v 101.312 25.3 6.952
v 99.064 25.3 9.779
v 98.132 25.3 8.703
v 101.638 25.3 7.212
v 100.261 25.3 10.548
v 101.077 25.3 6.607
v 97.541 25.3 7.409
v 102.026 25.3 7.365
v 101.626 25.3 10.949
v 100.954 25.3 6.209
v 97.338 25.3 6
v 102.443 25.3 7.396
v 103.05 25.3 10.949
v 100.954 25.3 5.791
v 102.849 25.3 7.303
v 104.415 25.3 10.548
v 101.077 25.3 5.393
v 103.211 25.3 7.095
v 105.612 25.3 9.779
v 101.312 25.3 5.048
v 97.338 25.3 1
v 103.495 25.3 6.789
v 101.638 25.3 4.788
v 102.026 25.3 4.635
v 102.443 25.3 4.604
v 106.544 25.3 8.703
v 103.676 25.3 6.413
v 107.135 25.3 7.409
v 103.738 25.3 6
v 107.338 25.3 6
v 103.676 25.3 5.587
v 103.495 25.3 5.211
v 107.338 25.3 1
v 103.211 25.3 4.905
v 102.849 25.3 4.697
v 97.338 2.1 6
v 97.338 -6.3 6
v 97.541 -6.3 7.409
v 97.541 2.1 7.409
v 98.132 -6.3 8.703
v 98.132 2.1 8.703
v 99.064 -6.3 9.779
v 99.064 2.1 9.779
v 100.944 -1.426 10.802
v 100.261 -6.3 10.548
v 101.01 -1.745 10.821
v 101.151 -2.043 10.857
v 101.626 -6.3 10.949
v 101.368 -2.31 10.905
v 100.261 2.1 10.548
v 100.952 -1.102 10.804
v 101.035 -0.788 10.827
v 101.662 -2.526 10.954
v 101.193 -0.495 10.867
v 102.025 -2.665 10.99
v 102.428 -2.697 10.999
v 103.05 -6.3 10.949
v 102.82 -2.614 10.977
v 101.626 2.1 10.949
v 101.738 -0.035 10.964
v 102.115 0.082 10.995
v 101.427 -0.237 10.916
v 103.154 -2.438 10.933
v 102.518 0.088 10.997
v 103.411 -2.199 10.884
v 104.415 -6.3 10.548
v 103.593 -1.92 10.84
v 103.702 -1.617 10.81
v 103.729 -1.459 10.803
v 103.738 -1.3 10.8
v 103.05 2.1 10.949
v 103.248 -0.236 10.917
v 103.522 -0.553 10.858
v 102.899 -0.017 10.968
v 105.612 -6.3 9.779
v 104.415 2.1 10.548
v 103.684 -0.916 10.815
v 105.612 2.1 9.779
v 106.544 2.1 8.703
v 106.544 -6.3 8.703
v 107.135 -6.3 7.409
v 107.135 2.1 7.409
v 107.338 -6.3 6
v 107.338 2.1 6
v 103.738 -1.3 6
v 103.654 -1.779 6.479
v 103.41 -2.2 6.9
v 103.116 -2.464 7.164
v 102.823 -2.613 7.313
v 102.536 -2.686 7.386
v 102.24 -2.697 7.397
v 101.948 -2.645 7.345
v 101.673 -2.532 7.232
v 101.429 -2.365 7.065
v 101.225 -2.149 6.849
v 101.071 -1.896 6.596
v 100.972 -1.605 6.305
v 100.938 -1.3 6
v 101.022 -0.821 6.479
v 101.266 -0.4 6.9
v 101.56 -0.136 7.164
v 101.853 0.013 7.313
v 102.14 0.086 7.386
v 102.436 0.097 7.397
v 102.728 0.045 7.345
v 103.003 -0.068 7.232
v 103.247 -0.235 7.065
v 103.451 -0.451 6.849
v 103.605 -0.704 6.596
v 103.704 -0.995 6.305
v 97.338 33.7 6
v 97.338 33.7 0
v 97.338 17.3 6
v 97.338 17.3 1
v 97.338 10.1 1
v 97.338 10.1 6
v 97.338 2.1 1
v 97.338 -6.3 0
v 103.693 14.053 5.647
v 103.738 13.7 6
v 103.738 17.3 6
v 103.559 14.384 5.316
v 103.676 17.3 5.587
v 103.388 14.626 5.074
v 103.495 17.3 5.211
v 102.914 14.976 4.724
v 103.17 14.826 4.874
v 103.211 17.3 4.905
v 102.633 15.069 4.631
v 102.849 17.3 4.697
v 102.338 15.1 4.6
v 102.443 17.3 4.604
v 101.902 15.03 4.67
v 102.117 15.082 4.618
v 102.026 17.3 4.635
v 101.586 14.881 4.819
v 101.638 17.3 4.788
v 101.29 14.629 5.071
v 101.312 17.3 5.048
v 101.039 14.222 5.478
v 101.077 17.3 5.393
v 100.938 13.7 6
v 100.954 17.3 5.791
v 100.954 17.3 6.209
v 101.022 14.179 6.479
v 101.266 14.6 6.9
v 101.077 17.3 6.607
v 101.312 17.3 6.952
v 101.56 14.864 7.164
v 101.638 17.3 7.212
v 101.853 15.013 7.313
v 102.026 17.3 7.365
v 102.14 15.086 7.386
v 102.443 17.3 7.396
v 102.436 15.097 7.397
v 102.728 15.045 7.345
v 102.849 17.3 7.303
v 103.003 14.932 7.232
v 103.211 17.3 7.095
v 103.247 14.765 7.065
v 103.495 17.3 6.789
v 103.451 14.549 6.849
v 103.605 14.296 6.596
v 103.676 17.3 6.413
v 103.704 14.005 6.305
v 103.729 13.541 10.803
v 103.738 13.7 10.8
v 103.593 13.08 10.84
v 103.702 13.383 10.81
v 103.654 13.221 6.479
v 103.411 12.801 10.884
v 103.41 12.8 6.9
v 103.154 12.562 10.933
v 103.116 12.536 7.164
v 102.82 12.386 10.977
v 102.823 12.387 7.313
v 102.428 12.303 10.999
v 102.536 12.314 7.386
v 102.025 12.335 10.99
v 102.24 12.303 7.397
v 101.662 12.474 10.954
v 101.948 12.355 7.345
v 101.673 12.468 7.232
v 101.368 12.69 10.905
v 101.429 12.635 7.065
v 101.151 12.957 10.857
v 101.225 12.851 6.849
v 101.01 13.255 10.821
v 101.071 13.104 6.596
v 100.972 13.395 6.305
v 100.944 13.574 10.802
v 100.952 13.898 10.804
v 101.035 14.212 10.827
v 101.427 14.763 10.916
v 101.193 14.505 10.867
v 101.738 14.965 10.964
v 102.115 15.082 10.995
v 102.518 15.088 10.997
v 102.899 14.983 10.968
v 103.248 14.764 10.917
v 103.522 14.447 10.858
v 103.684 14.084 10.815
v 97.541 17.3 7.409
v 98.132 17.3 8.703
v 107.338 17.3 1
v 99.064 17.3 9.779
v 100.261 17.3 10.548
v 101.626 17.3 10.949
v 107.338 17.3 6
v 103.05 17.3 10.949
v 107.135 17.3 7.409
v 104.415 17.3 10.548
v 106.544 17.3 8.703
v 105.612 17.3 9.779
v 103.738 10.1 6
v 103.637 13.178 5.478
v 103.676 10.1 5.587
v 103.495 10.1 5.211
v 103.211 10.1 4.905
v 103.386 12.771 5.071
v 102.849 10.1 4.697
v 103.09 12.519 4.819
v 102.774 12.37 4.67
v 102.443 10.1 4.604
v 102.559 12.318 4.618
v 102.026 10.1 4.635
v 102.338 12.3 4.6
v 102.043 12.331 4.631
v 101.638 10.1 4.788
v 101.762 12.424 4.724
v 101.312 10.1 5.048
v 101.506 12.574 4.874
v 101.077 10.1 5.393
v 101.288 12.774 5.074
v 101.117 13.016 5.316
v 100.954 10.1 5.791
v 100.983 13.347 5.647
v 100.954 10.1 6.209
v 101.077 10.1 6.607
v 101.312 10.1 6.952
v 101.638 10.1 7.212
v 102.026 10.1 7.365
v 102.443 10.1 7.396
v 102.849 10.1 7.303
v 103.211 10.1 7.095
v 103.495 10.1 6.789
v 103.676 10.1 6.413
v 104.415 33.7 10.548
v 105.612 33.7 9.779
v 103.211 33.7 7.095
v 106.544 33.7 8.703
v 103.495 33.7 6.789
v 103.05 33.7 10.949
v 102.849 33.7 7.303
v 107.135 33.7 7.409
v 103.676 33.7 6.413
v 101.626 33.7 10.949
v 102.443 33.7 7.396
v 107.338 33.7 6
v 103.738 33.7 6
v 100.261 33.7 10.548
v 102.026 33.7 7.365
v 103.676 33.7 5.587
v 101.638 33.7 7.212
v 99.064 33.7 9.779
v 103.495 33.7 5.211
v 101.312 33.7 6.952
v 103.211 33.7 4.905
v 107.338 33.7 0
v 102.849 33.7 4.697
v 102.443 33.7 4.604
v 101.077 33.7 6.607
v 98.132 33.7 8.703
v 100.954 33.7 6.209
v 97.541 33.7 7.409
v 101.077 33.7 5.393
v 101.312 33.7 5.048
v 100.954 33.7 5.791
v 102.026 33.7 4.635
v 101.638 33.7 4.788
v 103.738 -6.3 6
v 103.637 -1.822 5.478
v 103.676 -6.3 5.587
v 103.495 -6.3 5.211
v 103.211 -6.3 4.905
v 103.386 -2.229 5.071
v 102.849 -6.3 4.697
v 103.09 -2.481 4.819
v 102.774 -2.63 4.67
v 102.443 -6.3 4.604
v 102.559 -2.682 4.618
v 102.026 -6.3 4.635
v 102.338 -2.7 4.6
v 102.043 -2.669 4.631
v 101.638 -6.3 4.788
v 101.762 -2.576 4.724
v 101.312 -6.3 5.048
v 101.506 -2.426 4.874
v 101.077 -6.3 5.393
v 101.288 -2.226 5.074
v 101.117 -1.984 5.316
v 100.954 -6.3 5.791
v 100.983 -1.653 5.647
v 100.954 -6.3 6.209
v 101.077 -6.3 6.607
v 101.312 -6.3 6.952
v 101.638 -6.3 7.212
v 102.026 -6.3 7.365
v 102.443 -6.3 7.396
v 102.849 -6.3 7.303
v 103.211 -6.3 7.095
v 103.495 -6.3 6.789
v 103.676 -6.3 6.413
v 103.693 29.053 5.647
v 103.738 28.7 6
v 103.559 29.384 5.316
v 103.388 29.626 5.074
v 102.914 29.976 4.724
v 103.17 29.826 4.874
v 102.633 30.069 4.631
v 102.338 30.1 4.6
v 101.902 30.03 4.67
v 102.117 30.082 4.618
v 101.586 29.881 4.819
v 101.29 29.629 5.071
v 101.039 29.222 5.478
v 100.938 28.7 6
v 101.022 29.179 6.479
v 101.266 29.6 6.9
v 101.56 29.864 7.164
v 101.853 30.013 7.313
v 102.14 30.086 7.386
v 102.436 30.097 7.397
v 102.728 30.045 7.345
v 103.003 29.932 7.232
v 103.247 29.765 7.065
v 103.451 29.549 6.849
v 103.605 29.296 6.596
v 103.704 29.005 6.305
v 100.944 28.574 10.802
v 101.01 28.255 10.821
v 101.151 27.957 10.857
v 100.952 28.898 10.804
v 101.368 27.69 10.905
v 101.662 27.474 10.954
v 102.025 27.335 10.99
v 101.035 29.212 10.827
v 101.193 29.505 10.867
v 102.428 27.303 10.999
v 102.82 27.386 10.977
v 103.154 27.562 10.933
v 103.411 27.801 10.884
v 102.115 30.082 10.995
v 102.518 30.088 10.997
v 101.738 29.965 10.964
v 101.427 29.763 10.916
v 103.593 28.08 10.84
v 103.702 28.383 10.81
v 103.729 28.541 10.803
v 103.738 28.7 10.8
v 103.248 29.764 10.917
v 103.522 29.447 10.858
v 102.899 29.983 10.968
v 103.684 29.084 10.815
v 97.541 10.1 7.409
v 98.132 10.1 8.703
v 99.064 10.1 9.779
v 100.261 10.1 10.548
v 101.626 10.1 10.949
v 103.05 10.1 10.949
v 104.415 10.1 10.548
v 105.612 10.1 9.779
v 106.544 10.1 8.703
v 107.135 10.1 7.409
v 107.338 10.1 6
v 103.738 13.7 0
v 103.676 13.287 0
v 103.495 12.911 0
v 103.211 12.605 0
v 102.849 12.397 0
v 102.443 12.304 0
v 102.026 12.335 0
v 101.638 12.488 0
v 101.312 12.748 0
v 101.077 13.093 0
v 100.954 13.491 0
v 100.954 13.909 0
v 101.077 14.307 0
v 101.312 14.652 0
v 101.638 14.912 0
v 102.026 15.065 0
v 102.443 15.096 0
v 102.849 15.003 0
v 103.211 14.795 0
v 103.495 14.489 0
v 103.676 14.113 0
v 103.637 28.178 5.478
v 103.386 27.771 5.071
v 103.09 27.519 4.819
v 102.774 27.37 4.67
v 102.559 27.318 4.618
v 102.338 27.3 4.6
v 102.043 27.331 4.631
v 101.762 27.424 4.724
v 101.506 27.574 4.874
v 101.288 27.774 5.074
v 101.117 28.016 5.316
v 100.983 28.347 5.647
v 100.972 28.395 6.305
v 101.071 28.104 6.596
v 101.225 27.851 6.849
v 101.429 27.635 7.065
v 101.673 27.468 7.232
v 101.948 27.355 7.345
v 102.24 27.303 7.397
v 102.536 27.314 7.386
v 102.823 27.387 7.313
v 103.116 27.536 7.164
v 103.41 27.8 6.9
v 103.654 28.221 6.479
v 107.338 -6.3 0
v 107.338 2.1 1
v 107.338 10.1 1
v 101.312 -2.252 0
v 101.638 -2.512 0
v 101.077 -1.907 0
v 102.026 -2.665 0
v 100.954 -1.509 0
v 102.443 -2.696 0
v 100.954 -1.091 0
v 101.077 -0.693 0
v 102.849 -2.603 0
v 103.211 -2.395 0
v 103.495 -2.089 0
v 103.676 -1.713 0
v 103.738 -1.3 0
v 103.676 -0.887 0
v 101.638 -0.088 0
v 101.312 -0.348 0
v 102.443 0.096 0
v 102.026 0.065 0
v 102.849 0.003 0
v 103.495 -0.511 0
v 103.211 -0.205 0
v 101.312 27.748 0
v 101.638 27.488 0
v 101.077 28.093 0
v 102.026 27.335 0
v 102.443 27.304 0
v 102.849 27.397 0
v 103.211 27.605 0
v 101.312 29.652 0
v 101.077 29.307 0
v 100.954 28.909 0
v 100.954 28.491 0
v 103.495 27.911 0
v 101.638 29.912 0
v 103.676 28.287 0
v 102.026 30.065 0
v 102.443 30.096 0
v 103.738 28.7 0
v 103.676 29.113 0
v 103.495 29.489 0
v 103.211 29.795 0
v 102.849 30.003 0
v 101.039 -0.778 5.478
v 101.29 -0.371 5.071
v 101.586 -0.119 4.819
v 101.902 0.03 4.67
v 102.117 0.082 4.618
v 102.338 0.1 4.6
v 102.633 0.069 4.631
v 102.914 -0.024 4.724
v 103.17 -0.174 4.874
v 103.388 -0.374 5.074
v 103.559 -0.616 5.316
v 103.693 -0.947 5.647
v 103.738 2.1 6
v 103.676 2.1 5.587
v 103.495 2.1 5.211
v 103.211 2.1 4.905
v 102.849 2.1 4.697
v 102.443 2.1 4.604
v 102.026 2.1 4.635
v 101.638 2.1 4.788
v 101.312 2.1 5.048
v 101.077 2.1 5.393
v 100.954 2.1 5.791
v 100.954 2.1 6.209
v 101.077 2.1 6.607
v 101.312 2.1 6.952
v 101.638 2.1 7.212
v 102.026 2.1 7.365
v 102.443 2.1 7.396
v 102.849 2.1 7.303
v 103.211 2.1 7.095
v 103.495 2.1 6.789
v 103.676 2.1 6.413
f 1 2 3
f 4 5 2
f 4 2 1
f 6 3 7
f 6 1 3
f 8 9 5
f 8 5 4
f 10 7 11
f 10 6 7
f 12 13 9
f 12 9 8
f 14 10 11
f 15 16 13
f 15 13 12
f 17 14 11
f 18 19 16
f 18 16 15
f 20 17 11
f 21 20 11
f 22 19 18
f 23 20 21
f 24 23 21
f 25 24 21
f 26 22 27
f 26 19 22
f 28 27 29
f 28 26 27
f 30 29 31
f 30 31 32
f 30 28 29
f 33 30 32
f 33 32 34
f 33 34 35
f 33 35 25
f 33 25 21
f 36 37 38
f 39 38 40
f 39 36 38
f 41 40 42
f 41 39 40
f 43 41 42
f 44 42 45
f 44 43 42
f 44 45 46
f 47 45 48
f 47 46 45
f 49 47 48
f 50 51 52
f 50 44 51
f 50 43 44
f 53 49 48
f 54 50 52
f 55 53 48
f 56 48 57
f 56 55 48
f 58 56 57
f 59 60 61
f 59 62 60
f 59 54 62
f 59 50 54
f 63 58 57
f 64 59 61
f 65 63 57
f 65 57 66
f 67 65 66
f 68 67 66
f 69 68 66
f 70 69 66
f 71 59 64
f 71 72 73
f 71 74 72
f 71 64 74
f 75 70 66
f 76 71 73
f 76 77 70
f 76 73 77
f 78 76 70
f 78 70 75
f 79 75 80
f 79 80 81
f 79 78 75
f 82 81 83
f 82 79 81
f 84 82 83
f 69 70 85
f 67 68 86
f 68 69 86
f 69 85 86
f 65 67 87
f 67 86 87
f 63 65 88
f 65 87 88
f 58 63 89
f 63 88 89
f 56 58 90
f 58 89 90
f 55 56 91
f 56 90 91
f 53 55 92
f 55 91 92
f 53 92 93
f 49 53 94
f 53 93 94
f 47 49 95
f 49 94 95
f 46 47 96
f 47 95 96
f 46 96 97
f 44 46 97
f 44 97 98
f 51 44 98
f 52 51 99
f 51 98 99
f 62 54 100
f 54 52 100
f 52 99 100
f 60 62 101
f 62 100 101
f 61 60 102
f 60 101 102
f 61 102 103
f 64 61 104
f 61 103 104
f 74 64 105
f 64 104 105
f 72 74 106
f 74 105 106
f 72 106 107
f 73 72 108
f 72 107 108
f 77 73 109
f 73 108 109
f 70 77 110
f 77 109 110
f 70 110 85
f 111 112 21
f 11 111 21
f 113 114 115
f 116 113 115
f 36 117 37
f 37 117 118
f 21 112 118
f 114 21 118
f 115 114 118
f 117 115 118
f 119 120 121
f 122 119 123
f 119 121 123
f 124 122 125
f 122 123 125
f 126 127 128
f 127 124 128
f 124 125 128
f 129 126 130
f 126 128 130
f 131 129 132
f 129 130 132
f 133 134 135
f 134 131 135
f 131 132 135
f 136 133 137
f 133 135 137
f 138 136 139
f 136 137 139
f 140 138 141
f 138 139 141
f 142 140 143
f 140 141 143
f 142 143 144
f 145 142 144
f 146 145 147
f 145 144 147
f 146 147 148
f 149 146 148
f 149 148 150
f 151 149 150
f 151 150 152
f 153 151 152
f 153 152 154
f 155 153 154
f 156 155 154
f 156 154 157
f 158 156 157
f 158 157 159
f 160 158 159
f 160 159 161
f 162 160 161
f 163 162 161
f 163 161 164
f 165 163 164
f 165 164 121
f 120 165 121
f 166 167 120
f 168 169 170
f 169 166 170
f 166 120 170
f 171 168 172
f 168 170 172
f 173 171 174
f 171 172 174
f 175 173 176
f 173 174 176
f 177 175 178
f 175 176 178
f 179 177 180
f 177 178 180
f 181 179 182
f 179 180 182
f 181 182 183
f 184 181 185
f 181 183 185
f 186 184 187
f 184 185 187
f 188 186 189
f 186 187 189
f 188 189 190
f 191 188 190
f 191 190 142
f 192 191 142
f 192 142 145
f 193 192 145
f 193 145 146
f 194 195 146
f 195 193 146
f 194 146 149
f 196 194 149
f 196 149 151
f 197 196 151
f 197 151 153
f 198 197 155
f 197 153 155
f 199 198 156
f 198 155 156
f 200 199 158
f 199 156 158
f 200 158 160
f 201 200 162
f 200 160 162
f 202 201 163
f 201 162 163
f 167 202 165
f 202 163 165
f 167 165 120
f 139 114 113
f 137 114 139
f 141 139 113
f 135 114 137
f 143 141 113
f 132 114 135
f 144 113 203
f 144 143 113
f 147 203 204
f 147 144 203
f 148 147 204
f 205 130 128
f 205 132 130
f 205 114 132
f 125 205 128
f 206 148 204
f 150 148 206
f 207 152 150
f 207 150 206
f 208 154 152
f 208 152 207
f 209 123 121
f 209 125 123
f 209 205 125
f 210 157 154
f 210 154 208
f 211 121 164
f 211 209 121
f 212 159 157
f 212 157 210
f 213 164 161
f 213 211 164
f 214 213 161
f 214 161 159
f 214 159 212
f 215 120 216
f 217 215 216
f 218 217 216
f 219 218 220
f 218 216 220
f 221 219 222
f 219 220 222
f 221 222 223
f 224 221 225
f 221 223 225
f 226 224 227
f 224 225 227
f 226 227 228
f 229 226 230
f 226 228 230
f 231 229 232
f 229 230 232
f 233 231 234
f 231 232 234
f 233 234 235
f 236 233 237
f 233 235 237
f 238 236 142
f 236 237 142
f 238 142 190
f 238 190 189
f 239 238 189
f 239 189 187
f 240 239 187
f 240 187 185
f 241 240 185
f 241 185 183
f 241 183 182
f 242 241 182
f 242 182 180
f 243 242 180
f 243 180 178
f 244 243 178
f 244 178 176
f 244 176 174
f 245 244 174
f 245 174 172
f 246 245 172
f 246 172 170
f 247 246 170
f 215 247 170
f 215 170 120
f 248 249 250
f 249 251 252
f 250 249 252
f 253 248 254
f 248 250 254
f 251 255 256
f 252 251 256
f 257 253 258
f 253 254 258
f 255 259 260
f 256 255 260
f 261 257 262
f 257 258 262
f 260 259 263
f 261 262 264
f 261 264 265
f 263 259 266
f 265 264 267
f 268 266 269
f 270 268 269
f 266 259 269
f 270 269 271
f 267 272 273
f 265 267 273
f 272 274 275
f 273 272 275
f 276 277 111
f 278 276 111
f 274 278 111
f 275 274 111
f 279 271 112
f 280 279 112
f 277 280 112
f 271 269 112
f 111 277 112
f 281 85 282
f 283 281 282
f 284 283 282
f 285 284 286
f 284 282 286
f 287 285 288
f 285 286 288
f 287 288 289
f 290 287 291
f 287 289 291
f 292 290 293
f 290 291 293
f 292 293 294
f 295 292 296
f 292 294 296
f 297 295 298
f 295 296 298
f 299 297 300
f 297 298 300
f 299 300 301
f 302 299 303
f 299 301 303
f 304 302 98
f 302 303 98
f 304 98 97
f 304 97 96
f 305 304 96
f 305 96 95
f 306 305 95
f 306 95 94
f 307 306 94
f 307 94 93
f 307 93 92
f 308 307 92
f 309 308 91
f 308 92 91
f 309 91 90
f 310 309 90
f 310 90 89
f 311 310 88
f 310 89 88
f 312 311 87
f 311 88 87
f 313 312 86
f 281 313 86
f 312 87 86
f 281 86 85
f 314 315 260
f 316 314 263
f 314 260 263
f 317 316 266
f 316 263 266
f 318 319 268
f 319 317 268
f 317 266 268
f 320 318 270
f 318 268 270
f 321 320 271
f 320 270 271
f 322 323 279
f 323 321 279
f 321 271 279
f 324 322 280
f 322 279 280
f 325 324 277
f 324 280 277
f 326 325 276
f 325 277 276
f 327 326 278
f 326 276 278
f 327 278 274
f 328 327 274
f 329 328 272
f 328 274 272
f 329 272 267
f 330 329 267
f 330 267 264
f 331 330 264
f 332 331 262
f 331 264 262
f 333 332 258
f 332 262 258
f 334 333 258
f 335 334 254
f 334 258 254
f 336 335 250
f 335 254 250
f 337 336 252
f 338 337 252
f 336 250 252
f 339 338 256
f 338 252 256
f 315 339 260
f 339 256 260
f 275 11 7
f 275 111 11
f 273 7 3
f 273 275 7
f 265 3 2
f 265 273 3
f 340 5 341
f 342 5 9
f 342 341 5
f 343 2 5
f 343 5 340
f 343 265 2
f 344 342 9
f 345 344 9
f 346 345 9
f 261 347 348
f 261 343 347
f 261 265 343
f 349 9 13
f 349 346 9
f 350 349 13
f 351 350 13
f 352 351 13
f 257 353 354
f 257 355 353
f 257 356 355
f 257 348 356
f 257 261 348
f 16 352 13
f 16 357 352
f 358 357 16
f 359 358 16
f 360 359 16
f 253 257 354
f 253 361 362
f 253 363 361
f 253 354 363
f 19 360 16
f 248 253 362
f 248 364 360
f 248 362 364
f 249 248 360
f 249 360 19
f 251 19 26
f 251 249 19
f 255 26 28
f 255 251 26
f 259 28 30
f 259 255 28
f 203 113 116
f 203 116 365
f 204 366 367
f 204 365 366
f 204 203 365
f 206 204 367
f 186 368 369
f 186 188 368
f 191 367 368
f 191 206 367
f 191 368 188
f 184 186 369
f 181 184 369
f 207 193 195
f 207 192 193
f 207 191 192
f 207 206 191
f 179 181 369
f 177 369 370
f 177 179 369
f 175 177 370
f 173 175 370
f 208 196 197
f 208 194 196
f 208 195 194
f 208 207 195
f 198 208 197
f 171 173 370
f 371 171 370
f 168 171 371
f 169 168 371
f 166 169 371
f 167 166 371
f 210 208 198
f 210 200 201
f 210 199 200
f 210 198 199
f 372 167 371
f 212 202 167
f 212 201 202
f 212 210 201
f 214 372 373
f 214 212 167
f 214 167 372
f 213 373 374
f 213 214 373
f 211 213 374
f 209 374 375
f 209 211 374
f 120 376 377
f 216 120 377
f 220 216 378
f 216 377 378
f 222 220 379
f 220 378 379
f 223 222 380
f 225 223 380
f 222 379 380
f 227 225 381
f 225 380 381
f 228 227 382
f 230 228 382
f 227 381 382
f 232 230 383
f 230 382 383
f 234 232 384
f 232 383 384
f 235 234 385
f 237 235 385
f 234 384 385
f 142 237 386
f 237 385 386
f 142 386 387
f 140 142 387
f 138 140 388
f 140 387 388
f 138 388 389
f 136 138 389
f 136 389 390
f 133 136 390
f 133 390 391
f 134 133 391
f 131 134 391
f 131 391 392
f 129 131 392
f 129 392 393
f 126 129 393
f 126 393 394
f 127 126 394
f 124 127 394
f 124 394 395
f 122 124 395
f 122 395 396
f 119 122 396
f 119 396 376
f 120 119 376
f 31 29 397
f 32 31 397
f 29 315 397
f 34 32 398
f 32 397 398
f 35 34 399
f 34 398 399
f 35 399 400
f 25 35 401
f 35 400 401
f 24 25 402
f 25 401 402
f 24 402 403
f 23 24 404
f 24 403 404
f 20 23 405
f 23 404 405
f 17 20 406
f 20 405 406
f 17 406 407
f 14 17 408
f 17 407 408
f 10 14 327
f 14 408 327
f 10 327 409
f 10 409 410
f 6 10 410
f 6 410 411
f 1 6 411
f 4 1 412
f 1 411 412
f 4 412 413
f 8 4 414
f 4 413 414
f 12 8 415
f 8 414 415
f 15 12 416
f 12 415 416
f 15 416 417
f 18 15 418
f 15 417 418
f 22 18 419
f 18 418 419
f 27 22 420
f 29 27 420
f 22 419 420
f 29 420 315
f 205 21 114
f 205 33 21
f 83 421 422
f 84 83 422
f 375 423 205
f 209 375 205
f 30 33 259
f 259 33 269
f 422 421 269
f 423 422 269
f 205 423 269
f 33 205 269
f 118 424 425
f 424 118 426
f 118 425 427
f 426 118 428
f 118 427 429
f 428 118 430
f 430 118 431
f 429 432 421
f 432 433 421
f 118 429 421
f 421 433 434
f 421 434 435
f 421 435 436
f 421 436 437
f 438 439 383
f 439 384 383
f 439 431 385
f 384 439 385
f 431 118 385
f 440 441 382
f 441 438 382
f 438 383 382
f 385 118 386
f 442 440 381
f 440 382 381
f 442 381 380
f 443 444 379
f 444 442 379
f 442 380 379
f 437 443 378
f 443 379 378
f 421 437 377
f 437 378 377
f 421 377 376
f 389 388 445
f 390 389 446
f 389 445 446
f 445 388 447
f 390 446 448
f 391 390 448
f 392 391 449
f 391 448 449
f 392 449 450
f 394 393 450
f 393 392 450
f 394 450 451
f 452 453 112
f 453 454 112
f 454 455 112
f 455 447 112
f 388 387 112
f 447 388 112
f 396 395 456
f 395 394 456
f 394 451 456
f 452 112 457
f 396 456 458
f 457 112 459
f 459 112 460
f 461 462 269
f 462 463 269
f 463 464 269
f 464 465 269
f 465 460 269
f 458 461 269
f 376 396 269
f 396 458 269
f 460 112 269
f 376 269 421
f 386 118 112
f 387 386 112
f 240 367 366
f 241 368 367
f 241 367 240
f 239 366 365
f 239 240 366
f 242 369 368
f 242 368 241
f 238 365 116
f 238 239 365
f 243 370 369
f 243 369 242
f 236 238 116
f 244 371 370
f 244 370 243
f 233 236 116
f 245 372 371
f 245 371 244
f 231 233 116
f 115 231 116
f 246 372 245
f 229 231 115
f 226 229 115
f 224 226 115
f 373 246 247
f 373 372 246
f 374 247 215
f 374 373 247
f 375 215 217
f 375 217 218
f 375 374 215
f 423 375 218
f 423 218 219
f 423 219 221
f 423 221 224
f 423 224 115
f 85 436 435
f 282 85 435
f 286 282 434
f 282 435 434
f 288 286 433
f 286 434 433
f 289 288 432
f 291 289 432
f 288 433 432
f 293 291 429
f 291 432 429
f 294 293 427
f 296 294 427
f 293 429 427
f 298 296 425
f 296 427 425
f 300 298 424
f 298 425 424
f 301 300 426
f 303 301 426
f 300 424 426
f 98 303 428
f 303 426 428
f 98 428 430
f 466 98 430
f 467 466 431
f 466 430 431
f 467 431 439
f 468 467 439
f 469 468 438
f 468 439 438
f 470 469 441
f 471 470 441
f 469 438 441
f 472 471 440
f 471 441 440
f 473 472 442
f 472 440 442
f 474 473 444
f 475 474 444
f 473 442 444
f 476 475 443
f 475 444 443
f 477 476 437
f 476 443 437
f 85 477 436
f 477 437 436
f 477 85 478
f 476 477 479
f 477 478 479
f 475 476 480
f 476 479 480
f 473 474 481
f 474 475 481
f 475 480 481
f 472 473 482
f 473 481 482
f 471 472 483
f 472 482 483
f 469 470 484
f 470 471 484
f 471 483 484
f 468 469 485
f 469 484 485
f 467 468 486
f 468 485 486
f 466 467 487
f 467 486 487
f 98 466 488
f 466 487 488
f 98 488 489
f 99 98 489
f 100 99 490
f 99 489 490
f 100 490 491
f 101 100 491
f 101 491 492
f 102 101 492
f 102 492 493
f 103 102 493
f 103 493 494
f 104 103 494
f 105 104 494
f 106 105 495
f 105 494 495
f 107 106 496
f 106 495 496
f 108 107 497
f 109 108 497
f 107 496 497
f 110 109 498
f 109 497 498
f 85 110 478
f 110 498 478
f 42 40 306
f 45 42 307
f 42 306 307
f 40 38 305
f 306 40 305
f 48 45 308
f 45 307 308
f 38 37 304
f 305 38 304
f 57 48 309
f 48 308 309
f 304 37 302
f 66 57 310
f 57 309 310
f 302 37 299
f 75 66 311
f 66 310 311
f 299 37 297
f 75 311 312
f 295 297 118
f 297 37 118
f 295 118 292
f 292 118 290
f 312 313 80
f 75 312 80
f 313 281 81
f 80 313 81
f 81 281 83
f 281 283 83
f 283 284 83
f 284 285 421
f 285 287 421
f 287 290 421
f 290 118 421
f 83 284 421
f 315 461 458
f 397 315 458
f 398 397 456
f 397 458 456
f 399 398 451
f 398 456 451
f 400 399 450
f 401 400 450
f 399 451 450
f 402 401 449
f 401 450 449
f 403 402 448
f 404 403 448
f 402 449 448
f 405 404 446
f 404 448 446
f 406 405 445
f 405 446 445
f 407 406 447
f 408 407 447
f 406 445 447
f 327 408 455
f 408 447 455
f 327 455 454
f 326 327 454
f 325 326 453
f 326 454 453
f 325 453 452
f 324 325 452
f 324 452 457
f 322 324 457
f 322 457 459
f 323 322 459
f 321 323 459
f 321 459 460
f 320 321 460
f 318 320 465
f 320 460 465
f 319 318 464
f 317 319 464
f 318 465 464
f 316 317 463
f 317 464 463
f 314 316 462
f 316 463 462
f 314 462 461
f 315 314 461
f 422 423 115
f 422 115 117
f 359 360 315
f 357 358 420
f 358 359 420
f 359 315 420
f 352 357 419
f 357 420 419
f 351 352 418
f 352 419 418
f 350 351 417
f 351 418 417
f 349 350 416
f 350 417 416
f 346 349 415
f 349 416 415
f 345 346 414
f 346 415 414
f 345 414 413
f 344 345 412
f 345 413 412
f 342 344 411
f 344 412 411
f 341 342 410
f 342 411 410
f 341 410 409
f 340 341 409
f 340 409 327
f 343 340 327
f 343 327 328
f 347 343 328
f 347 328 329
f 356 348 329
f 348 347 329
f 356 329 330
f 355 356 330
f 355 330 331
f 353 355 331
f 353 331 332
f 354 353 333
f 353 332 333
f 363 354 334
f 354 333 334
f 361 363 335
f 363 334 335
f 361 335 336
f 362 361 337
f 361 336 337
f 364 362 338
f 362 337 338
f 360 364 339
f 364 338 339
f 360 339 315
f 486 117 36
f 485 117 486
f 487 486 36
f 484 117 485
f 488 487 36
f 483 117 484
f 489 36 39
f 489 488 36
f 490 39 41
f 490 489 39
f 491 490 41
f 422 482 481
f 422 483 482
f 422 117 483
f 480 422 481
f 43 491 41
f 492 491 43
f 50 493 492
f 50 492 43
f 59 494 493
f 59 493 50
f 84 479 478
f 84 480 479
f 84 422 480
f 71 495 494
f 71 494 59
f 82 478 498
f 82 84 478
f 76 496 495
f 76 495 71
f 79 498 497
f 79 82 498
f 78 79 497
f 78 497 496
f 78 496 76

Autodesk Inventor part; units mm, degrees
ref_plane "YZ Plane" through (0, 0, 0) normal (1, 0, 0) x (0, 1, 0)
ref_plane "XZ Plane" through (0, 0, 0) normal (0, 1, 0) x (-1, 0, 0)
ref_plane "XY Plane" through (0, 0, 0) normal (0, 0, 1) x (1, 0, 0)
ref_plane "Arbeitsebene1" through (0, 0, 0) normal (0, 0, 1) x (1, 0, 0)
sketch "Skizze1" plane through (0, 0, 0) normal (0, 0, 1) x (1, 0, 0)
  line L0 (-118.5, -74.5) -> (-118.5, 74.5) projected
  arc A0 (-118.5, -74.5) -> (-103.5, -89.5) centre (-103.5, -74.5) ccw projected
  line L1 (56.1, -89.5) -> (-103.5, -89.5) projected
  line L2 (56.1, -83) -> (56.1, -89.5) projected
  arc A1 (71.1, -68) -> (56.1, -83) centre (71.1, -83) ccw projected
  line L3 (80.5, -68) -> (71.1, -68) projected
  arc A2 (95.5, -83) -> (80.5, -68) centre (80.5, -83) ccw projected
  line L4 (95.5, -89.5) -> (95.5, -83) projected
  line L5 (103.5, -89.5) -> (95.5, -89.5) projected
  arc A3 (103.5, -89.5) -> (118.5, -74.5) centre (103.5, -74.5) ccw projected
  line L6 (118.5, 74.5) -> (118.5, -74.5) projected
  arc A4 (118.5, 74.5) -> (103.5, 89.5) centre (103.5, 74.5) ccw projected
  line L7 (-103.5, 89.5) -> (103.5, 89.5) projected
  arc A5 (-103.5, 89.5) -> (-118.5, 74.5) centre (-103.5, 74.5) ccw projected
  circle A6 centre (-58.5, 18.7) radius 1.4 projected
  circle A7 centre (-58.5, 36.552) radius 1.4 projected
  circle A8 centre (57.5, 20.252) radius 1.4 projected
  circle A9 centre (57.5, 35) radius 1.4 projected
  circle A10 centre (-58.5, 8.7) radius 1.4 projected
  circle A11 centre (-58.5, -9.152) radius 1.4 projected
  circle A12 centre (57.5, 7.148) radius 1.4 projected
  circle A13 centre (57.5, -7.6) radius 1.4 projected
  circle A14 centre (103.5, 74.5) radius 1.4 projected
  circle A15 centre (103.5, -74.5) radius 1.4 projected
  circle A16 centre (-103.5, -74.5) radius 1.4 projected
  circle A17 centre (-103.5, 74.5) radius 1.4 projected
  line L8 (20.9567, 0.5738) -> (-20.9567, 0.5738) projected
  line L9 (-20.9567, 0.5738) -> (-20.9567, 30.6837) projected
  line L10 (-20.9567, 30.6837) -> (20.9567, 30.6837) projected
  line L11 (20.9567, 30.6837) -> (20.9567, 0.5738) projected
  circle A18 centre (73.1917, -22.4328) radius 1.4 projected
  circle A19 centre (43.1917, -22.4328) radius 1.4 projected
  circle A20 centre (13.1917, -22.4328) radius 1.4 projected
  circle A21 centre (-16.8083, -22.4328) radius 1.4 projected
  circle A22 centre (-46.8083, -22.4328) radius 1.4 projected
  circle A23 centre (-102.338, -1.3) radius 1.4 projected
  circle A24 centre (-102.338, 13.7) radius 1.4 projected
  circle A25 centre (-102.338, 28.7) radius 1.4 projected
  circle A26 centre (102.338, 28.7) radius 1.4 projected
  circle A27 centre (-73.1917, -22.4328) radius 1.4 projected
  circle A28 centre (-43.1917, -22.4328) radius 1.4 projected
  circle A29 centre (-13.1917, -22.4328) radius 1.4 projected
  circle A30 centre (16.8083, -22.4328) radius 1.4 projected
  circle A31 centre (46.8083, -22.4328) radius 1.4 projected
  circle A32 centre (102.338, -1.3) radius 1.4 projected
  circle A33 centre (102.338, 13.7) radius 1.4 projected
  line L12 (97.338, -6.3) -> (107.338, -6.3)
  line L13 (107.338, -6.3) -> (107.338, 33.7)
  line L14 (107.338, 33.7) -> (97.338, 33.7)
  line L15 (97.338, 33.7) -> (97.338, -6.3)
  line L16 (97.338, -6.3) -> (107.338, 33.7) construction
  line L17 (107.338, -6.3) -> (97.338, 33.7) construction
  line L18 (76.5043, -50) -> (76.5043, 50) projected
  arc A34 (96.5043, 50) -> (76.5043, 50) centre (86.5043, 50) ccw projected
  line L19 (96.5043, 50) -> (96.5043, -50) projected
  arc A35 (76.5043, -50) -> (96.5043, -50) centre (86.5043, -50) ccw projected
  line L20 (-95.8131, -50) -> (-95.8131, 50) projected
  arc A36 (-75.8131, 50) -> (-95.8131, 50) centre (-85.8131, 50) ccw projected
  line L21 (-75.8131, 50) -> (-75.8131, -50) projected
  arc A37 (-95.8131, -50) -> (-75.8131, -50) centre (-85.8131, -50) ccw projected
  circle A38 centre (-108.5, 79.5) radius 1.4 projected
  circle A39 centre (-108.5, -79.5) radius 1.4 projected
  circle A40 centre (108.5, 79.5) radius 1.4 projected
  circle A41 centre (108.5, -79.5) radius 1.4 projected
  point P0 (0, 0)
  dimension "d0" = 10
  dimension "d1" = 40
extrude "Extrusion1" add sketch "Skizze1" along normal blind 50 contours L15 L14 L13 L12
fillet "Rundung1" radius 5 2 edges at (102.338, -6.3, 50) (102.338, 33.7, 50)
sketch "Skizze2" plane through (97.338, 33.7, 0) normal (0, 1, 0) x (1, 0, 0)
  line L0 (10, -45) -> (0, -45) projected
  line L1 (10, 0) -> (10, -45) projected
  line L2 (10, 0) -> (0, 0) projected
  line L3 (0, 0) -> (0, -45) projected
  circle A0 centre (5, -6) radius 5
  line L4 (10, 0) -> (10, -45) projected
  circle A1 centre (5, -6) radius 1.4
  point P0 (-97.338, 0)
  point P1 (0, -6)
  point P2 (10, -6)
  dimension "d5" = 6
  dimension "d8" = 2.8
extrude "Extrusion2" cut sketch "Skizze2" against normal through all contours A0 L3 L2 L1 | A0 keep common part
sketch "Skizze3" plane through (107.338, -6.3, 0) normal (1, 0, 0) x (0, 0, -1)
  line L0 (0, 40) -> (-6, 40) projected
  line L1 (0, 0) -> (-6, 0) projected
  line L2 (-4.6, 33.6) -> (0, 33.6) projected
  line L3 (-4.6, 21.4) -> (0, 21.4) projected
  line L4 (-4.6, 18.6) -> (0, 18.6) projected
  line L5 (-4.6, 6.4) -> (0, 6.4) projected
  line L6 (-4.6, 3.6) -> (0, 3.6) projected
  line L7 (-4.6, 36.4) -> (0, 36.4) projected
  line L8 (-11, 40) -> (-11, 0) projected
  line L9 (-11, 31.6) -> (-1, 31.6)
  line L10 (-1, 31.6) -> (-1, 23.6)
  line L11 (-1, 23.6) -> (-11, 23.6)
  line L12 (-11, 23.6) -> (-11, 31.6)
  line L13 (-11, 16.4) -> (-1, 16.4)
  line L14 (-1, 16.4) -> (-1, 8.4)
  line L15 (-1, 8.4) -> (-11, 8.4)
  line L16 (-11, 8.4) -> (-11, 16.4)
  point P0 (0, 6.3)
  point P1 (-11, 8.4)
  point P2 (-11, 23.6)
  dimension "d9" = 10
  dimension "d10" = 8
  dimension "d11" = 10
  dimension "d12" = 8
  dimension "d13" = 2
  dimension "d14" = 2.2
extrude "Extrusion3" cut sketch "Skizze3" against normal blind 10
properties part number "60_Planktoscope_Illuminationsource"
